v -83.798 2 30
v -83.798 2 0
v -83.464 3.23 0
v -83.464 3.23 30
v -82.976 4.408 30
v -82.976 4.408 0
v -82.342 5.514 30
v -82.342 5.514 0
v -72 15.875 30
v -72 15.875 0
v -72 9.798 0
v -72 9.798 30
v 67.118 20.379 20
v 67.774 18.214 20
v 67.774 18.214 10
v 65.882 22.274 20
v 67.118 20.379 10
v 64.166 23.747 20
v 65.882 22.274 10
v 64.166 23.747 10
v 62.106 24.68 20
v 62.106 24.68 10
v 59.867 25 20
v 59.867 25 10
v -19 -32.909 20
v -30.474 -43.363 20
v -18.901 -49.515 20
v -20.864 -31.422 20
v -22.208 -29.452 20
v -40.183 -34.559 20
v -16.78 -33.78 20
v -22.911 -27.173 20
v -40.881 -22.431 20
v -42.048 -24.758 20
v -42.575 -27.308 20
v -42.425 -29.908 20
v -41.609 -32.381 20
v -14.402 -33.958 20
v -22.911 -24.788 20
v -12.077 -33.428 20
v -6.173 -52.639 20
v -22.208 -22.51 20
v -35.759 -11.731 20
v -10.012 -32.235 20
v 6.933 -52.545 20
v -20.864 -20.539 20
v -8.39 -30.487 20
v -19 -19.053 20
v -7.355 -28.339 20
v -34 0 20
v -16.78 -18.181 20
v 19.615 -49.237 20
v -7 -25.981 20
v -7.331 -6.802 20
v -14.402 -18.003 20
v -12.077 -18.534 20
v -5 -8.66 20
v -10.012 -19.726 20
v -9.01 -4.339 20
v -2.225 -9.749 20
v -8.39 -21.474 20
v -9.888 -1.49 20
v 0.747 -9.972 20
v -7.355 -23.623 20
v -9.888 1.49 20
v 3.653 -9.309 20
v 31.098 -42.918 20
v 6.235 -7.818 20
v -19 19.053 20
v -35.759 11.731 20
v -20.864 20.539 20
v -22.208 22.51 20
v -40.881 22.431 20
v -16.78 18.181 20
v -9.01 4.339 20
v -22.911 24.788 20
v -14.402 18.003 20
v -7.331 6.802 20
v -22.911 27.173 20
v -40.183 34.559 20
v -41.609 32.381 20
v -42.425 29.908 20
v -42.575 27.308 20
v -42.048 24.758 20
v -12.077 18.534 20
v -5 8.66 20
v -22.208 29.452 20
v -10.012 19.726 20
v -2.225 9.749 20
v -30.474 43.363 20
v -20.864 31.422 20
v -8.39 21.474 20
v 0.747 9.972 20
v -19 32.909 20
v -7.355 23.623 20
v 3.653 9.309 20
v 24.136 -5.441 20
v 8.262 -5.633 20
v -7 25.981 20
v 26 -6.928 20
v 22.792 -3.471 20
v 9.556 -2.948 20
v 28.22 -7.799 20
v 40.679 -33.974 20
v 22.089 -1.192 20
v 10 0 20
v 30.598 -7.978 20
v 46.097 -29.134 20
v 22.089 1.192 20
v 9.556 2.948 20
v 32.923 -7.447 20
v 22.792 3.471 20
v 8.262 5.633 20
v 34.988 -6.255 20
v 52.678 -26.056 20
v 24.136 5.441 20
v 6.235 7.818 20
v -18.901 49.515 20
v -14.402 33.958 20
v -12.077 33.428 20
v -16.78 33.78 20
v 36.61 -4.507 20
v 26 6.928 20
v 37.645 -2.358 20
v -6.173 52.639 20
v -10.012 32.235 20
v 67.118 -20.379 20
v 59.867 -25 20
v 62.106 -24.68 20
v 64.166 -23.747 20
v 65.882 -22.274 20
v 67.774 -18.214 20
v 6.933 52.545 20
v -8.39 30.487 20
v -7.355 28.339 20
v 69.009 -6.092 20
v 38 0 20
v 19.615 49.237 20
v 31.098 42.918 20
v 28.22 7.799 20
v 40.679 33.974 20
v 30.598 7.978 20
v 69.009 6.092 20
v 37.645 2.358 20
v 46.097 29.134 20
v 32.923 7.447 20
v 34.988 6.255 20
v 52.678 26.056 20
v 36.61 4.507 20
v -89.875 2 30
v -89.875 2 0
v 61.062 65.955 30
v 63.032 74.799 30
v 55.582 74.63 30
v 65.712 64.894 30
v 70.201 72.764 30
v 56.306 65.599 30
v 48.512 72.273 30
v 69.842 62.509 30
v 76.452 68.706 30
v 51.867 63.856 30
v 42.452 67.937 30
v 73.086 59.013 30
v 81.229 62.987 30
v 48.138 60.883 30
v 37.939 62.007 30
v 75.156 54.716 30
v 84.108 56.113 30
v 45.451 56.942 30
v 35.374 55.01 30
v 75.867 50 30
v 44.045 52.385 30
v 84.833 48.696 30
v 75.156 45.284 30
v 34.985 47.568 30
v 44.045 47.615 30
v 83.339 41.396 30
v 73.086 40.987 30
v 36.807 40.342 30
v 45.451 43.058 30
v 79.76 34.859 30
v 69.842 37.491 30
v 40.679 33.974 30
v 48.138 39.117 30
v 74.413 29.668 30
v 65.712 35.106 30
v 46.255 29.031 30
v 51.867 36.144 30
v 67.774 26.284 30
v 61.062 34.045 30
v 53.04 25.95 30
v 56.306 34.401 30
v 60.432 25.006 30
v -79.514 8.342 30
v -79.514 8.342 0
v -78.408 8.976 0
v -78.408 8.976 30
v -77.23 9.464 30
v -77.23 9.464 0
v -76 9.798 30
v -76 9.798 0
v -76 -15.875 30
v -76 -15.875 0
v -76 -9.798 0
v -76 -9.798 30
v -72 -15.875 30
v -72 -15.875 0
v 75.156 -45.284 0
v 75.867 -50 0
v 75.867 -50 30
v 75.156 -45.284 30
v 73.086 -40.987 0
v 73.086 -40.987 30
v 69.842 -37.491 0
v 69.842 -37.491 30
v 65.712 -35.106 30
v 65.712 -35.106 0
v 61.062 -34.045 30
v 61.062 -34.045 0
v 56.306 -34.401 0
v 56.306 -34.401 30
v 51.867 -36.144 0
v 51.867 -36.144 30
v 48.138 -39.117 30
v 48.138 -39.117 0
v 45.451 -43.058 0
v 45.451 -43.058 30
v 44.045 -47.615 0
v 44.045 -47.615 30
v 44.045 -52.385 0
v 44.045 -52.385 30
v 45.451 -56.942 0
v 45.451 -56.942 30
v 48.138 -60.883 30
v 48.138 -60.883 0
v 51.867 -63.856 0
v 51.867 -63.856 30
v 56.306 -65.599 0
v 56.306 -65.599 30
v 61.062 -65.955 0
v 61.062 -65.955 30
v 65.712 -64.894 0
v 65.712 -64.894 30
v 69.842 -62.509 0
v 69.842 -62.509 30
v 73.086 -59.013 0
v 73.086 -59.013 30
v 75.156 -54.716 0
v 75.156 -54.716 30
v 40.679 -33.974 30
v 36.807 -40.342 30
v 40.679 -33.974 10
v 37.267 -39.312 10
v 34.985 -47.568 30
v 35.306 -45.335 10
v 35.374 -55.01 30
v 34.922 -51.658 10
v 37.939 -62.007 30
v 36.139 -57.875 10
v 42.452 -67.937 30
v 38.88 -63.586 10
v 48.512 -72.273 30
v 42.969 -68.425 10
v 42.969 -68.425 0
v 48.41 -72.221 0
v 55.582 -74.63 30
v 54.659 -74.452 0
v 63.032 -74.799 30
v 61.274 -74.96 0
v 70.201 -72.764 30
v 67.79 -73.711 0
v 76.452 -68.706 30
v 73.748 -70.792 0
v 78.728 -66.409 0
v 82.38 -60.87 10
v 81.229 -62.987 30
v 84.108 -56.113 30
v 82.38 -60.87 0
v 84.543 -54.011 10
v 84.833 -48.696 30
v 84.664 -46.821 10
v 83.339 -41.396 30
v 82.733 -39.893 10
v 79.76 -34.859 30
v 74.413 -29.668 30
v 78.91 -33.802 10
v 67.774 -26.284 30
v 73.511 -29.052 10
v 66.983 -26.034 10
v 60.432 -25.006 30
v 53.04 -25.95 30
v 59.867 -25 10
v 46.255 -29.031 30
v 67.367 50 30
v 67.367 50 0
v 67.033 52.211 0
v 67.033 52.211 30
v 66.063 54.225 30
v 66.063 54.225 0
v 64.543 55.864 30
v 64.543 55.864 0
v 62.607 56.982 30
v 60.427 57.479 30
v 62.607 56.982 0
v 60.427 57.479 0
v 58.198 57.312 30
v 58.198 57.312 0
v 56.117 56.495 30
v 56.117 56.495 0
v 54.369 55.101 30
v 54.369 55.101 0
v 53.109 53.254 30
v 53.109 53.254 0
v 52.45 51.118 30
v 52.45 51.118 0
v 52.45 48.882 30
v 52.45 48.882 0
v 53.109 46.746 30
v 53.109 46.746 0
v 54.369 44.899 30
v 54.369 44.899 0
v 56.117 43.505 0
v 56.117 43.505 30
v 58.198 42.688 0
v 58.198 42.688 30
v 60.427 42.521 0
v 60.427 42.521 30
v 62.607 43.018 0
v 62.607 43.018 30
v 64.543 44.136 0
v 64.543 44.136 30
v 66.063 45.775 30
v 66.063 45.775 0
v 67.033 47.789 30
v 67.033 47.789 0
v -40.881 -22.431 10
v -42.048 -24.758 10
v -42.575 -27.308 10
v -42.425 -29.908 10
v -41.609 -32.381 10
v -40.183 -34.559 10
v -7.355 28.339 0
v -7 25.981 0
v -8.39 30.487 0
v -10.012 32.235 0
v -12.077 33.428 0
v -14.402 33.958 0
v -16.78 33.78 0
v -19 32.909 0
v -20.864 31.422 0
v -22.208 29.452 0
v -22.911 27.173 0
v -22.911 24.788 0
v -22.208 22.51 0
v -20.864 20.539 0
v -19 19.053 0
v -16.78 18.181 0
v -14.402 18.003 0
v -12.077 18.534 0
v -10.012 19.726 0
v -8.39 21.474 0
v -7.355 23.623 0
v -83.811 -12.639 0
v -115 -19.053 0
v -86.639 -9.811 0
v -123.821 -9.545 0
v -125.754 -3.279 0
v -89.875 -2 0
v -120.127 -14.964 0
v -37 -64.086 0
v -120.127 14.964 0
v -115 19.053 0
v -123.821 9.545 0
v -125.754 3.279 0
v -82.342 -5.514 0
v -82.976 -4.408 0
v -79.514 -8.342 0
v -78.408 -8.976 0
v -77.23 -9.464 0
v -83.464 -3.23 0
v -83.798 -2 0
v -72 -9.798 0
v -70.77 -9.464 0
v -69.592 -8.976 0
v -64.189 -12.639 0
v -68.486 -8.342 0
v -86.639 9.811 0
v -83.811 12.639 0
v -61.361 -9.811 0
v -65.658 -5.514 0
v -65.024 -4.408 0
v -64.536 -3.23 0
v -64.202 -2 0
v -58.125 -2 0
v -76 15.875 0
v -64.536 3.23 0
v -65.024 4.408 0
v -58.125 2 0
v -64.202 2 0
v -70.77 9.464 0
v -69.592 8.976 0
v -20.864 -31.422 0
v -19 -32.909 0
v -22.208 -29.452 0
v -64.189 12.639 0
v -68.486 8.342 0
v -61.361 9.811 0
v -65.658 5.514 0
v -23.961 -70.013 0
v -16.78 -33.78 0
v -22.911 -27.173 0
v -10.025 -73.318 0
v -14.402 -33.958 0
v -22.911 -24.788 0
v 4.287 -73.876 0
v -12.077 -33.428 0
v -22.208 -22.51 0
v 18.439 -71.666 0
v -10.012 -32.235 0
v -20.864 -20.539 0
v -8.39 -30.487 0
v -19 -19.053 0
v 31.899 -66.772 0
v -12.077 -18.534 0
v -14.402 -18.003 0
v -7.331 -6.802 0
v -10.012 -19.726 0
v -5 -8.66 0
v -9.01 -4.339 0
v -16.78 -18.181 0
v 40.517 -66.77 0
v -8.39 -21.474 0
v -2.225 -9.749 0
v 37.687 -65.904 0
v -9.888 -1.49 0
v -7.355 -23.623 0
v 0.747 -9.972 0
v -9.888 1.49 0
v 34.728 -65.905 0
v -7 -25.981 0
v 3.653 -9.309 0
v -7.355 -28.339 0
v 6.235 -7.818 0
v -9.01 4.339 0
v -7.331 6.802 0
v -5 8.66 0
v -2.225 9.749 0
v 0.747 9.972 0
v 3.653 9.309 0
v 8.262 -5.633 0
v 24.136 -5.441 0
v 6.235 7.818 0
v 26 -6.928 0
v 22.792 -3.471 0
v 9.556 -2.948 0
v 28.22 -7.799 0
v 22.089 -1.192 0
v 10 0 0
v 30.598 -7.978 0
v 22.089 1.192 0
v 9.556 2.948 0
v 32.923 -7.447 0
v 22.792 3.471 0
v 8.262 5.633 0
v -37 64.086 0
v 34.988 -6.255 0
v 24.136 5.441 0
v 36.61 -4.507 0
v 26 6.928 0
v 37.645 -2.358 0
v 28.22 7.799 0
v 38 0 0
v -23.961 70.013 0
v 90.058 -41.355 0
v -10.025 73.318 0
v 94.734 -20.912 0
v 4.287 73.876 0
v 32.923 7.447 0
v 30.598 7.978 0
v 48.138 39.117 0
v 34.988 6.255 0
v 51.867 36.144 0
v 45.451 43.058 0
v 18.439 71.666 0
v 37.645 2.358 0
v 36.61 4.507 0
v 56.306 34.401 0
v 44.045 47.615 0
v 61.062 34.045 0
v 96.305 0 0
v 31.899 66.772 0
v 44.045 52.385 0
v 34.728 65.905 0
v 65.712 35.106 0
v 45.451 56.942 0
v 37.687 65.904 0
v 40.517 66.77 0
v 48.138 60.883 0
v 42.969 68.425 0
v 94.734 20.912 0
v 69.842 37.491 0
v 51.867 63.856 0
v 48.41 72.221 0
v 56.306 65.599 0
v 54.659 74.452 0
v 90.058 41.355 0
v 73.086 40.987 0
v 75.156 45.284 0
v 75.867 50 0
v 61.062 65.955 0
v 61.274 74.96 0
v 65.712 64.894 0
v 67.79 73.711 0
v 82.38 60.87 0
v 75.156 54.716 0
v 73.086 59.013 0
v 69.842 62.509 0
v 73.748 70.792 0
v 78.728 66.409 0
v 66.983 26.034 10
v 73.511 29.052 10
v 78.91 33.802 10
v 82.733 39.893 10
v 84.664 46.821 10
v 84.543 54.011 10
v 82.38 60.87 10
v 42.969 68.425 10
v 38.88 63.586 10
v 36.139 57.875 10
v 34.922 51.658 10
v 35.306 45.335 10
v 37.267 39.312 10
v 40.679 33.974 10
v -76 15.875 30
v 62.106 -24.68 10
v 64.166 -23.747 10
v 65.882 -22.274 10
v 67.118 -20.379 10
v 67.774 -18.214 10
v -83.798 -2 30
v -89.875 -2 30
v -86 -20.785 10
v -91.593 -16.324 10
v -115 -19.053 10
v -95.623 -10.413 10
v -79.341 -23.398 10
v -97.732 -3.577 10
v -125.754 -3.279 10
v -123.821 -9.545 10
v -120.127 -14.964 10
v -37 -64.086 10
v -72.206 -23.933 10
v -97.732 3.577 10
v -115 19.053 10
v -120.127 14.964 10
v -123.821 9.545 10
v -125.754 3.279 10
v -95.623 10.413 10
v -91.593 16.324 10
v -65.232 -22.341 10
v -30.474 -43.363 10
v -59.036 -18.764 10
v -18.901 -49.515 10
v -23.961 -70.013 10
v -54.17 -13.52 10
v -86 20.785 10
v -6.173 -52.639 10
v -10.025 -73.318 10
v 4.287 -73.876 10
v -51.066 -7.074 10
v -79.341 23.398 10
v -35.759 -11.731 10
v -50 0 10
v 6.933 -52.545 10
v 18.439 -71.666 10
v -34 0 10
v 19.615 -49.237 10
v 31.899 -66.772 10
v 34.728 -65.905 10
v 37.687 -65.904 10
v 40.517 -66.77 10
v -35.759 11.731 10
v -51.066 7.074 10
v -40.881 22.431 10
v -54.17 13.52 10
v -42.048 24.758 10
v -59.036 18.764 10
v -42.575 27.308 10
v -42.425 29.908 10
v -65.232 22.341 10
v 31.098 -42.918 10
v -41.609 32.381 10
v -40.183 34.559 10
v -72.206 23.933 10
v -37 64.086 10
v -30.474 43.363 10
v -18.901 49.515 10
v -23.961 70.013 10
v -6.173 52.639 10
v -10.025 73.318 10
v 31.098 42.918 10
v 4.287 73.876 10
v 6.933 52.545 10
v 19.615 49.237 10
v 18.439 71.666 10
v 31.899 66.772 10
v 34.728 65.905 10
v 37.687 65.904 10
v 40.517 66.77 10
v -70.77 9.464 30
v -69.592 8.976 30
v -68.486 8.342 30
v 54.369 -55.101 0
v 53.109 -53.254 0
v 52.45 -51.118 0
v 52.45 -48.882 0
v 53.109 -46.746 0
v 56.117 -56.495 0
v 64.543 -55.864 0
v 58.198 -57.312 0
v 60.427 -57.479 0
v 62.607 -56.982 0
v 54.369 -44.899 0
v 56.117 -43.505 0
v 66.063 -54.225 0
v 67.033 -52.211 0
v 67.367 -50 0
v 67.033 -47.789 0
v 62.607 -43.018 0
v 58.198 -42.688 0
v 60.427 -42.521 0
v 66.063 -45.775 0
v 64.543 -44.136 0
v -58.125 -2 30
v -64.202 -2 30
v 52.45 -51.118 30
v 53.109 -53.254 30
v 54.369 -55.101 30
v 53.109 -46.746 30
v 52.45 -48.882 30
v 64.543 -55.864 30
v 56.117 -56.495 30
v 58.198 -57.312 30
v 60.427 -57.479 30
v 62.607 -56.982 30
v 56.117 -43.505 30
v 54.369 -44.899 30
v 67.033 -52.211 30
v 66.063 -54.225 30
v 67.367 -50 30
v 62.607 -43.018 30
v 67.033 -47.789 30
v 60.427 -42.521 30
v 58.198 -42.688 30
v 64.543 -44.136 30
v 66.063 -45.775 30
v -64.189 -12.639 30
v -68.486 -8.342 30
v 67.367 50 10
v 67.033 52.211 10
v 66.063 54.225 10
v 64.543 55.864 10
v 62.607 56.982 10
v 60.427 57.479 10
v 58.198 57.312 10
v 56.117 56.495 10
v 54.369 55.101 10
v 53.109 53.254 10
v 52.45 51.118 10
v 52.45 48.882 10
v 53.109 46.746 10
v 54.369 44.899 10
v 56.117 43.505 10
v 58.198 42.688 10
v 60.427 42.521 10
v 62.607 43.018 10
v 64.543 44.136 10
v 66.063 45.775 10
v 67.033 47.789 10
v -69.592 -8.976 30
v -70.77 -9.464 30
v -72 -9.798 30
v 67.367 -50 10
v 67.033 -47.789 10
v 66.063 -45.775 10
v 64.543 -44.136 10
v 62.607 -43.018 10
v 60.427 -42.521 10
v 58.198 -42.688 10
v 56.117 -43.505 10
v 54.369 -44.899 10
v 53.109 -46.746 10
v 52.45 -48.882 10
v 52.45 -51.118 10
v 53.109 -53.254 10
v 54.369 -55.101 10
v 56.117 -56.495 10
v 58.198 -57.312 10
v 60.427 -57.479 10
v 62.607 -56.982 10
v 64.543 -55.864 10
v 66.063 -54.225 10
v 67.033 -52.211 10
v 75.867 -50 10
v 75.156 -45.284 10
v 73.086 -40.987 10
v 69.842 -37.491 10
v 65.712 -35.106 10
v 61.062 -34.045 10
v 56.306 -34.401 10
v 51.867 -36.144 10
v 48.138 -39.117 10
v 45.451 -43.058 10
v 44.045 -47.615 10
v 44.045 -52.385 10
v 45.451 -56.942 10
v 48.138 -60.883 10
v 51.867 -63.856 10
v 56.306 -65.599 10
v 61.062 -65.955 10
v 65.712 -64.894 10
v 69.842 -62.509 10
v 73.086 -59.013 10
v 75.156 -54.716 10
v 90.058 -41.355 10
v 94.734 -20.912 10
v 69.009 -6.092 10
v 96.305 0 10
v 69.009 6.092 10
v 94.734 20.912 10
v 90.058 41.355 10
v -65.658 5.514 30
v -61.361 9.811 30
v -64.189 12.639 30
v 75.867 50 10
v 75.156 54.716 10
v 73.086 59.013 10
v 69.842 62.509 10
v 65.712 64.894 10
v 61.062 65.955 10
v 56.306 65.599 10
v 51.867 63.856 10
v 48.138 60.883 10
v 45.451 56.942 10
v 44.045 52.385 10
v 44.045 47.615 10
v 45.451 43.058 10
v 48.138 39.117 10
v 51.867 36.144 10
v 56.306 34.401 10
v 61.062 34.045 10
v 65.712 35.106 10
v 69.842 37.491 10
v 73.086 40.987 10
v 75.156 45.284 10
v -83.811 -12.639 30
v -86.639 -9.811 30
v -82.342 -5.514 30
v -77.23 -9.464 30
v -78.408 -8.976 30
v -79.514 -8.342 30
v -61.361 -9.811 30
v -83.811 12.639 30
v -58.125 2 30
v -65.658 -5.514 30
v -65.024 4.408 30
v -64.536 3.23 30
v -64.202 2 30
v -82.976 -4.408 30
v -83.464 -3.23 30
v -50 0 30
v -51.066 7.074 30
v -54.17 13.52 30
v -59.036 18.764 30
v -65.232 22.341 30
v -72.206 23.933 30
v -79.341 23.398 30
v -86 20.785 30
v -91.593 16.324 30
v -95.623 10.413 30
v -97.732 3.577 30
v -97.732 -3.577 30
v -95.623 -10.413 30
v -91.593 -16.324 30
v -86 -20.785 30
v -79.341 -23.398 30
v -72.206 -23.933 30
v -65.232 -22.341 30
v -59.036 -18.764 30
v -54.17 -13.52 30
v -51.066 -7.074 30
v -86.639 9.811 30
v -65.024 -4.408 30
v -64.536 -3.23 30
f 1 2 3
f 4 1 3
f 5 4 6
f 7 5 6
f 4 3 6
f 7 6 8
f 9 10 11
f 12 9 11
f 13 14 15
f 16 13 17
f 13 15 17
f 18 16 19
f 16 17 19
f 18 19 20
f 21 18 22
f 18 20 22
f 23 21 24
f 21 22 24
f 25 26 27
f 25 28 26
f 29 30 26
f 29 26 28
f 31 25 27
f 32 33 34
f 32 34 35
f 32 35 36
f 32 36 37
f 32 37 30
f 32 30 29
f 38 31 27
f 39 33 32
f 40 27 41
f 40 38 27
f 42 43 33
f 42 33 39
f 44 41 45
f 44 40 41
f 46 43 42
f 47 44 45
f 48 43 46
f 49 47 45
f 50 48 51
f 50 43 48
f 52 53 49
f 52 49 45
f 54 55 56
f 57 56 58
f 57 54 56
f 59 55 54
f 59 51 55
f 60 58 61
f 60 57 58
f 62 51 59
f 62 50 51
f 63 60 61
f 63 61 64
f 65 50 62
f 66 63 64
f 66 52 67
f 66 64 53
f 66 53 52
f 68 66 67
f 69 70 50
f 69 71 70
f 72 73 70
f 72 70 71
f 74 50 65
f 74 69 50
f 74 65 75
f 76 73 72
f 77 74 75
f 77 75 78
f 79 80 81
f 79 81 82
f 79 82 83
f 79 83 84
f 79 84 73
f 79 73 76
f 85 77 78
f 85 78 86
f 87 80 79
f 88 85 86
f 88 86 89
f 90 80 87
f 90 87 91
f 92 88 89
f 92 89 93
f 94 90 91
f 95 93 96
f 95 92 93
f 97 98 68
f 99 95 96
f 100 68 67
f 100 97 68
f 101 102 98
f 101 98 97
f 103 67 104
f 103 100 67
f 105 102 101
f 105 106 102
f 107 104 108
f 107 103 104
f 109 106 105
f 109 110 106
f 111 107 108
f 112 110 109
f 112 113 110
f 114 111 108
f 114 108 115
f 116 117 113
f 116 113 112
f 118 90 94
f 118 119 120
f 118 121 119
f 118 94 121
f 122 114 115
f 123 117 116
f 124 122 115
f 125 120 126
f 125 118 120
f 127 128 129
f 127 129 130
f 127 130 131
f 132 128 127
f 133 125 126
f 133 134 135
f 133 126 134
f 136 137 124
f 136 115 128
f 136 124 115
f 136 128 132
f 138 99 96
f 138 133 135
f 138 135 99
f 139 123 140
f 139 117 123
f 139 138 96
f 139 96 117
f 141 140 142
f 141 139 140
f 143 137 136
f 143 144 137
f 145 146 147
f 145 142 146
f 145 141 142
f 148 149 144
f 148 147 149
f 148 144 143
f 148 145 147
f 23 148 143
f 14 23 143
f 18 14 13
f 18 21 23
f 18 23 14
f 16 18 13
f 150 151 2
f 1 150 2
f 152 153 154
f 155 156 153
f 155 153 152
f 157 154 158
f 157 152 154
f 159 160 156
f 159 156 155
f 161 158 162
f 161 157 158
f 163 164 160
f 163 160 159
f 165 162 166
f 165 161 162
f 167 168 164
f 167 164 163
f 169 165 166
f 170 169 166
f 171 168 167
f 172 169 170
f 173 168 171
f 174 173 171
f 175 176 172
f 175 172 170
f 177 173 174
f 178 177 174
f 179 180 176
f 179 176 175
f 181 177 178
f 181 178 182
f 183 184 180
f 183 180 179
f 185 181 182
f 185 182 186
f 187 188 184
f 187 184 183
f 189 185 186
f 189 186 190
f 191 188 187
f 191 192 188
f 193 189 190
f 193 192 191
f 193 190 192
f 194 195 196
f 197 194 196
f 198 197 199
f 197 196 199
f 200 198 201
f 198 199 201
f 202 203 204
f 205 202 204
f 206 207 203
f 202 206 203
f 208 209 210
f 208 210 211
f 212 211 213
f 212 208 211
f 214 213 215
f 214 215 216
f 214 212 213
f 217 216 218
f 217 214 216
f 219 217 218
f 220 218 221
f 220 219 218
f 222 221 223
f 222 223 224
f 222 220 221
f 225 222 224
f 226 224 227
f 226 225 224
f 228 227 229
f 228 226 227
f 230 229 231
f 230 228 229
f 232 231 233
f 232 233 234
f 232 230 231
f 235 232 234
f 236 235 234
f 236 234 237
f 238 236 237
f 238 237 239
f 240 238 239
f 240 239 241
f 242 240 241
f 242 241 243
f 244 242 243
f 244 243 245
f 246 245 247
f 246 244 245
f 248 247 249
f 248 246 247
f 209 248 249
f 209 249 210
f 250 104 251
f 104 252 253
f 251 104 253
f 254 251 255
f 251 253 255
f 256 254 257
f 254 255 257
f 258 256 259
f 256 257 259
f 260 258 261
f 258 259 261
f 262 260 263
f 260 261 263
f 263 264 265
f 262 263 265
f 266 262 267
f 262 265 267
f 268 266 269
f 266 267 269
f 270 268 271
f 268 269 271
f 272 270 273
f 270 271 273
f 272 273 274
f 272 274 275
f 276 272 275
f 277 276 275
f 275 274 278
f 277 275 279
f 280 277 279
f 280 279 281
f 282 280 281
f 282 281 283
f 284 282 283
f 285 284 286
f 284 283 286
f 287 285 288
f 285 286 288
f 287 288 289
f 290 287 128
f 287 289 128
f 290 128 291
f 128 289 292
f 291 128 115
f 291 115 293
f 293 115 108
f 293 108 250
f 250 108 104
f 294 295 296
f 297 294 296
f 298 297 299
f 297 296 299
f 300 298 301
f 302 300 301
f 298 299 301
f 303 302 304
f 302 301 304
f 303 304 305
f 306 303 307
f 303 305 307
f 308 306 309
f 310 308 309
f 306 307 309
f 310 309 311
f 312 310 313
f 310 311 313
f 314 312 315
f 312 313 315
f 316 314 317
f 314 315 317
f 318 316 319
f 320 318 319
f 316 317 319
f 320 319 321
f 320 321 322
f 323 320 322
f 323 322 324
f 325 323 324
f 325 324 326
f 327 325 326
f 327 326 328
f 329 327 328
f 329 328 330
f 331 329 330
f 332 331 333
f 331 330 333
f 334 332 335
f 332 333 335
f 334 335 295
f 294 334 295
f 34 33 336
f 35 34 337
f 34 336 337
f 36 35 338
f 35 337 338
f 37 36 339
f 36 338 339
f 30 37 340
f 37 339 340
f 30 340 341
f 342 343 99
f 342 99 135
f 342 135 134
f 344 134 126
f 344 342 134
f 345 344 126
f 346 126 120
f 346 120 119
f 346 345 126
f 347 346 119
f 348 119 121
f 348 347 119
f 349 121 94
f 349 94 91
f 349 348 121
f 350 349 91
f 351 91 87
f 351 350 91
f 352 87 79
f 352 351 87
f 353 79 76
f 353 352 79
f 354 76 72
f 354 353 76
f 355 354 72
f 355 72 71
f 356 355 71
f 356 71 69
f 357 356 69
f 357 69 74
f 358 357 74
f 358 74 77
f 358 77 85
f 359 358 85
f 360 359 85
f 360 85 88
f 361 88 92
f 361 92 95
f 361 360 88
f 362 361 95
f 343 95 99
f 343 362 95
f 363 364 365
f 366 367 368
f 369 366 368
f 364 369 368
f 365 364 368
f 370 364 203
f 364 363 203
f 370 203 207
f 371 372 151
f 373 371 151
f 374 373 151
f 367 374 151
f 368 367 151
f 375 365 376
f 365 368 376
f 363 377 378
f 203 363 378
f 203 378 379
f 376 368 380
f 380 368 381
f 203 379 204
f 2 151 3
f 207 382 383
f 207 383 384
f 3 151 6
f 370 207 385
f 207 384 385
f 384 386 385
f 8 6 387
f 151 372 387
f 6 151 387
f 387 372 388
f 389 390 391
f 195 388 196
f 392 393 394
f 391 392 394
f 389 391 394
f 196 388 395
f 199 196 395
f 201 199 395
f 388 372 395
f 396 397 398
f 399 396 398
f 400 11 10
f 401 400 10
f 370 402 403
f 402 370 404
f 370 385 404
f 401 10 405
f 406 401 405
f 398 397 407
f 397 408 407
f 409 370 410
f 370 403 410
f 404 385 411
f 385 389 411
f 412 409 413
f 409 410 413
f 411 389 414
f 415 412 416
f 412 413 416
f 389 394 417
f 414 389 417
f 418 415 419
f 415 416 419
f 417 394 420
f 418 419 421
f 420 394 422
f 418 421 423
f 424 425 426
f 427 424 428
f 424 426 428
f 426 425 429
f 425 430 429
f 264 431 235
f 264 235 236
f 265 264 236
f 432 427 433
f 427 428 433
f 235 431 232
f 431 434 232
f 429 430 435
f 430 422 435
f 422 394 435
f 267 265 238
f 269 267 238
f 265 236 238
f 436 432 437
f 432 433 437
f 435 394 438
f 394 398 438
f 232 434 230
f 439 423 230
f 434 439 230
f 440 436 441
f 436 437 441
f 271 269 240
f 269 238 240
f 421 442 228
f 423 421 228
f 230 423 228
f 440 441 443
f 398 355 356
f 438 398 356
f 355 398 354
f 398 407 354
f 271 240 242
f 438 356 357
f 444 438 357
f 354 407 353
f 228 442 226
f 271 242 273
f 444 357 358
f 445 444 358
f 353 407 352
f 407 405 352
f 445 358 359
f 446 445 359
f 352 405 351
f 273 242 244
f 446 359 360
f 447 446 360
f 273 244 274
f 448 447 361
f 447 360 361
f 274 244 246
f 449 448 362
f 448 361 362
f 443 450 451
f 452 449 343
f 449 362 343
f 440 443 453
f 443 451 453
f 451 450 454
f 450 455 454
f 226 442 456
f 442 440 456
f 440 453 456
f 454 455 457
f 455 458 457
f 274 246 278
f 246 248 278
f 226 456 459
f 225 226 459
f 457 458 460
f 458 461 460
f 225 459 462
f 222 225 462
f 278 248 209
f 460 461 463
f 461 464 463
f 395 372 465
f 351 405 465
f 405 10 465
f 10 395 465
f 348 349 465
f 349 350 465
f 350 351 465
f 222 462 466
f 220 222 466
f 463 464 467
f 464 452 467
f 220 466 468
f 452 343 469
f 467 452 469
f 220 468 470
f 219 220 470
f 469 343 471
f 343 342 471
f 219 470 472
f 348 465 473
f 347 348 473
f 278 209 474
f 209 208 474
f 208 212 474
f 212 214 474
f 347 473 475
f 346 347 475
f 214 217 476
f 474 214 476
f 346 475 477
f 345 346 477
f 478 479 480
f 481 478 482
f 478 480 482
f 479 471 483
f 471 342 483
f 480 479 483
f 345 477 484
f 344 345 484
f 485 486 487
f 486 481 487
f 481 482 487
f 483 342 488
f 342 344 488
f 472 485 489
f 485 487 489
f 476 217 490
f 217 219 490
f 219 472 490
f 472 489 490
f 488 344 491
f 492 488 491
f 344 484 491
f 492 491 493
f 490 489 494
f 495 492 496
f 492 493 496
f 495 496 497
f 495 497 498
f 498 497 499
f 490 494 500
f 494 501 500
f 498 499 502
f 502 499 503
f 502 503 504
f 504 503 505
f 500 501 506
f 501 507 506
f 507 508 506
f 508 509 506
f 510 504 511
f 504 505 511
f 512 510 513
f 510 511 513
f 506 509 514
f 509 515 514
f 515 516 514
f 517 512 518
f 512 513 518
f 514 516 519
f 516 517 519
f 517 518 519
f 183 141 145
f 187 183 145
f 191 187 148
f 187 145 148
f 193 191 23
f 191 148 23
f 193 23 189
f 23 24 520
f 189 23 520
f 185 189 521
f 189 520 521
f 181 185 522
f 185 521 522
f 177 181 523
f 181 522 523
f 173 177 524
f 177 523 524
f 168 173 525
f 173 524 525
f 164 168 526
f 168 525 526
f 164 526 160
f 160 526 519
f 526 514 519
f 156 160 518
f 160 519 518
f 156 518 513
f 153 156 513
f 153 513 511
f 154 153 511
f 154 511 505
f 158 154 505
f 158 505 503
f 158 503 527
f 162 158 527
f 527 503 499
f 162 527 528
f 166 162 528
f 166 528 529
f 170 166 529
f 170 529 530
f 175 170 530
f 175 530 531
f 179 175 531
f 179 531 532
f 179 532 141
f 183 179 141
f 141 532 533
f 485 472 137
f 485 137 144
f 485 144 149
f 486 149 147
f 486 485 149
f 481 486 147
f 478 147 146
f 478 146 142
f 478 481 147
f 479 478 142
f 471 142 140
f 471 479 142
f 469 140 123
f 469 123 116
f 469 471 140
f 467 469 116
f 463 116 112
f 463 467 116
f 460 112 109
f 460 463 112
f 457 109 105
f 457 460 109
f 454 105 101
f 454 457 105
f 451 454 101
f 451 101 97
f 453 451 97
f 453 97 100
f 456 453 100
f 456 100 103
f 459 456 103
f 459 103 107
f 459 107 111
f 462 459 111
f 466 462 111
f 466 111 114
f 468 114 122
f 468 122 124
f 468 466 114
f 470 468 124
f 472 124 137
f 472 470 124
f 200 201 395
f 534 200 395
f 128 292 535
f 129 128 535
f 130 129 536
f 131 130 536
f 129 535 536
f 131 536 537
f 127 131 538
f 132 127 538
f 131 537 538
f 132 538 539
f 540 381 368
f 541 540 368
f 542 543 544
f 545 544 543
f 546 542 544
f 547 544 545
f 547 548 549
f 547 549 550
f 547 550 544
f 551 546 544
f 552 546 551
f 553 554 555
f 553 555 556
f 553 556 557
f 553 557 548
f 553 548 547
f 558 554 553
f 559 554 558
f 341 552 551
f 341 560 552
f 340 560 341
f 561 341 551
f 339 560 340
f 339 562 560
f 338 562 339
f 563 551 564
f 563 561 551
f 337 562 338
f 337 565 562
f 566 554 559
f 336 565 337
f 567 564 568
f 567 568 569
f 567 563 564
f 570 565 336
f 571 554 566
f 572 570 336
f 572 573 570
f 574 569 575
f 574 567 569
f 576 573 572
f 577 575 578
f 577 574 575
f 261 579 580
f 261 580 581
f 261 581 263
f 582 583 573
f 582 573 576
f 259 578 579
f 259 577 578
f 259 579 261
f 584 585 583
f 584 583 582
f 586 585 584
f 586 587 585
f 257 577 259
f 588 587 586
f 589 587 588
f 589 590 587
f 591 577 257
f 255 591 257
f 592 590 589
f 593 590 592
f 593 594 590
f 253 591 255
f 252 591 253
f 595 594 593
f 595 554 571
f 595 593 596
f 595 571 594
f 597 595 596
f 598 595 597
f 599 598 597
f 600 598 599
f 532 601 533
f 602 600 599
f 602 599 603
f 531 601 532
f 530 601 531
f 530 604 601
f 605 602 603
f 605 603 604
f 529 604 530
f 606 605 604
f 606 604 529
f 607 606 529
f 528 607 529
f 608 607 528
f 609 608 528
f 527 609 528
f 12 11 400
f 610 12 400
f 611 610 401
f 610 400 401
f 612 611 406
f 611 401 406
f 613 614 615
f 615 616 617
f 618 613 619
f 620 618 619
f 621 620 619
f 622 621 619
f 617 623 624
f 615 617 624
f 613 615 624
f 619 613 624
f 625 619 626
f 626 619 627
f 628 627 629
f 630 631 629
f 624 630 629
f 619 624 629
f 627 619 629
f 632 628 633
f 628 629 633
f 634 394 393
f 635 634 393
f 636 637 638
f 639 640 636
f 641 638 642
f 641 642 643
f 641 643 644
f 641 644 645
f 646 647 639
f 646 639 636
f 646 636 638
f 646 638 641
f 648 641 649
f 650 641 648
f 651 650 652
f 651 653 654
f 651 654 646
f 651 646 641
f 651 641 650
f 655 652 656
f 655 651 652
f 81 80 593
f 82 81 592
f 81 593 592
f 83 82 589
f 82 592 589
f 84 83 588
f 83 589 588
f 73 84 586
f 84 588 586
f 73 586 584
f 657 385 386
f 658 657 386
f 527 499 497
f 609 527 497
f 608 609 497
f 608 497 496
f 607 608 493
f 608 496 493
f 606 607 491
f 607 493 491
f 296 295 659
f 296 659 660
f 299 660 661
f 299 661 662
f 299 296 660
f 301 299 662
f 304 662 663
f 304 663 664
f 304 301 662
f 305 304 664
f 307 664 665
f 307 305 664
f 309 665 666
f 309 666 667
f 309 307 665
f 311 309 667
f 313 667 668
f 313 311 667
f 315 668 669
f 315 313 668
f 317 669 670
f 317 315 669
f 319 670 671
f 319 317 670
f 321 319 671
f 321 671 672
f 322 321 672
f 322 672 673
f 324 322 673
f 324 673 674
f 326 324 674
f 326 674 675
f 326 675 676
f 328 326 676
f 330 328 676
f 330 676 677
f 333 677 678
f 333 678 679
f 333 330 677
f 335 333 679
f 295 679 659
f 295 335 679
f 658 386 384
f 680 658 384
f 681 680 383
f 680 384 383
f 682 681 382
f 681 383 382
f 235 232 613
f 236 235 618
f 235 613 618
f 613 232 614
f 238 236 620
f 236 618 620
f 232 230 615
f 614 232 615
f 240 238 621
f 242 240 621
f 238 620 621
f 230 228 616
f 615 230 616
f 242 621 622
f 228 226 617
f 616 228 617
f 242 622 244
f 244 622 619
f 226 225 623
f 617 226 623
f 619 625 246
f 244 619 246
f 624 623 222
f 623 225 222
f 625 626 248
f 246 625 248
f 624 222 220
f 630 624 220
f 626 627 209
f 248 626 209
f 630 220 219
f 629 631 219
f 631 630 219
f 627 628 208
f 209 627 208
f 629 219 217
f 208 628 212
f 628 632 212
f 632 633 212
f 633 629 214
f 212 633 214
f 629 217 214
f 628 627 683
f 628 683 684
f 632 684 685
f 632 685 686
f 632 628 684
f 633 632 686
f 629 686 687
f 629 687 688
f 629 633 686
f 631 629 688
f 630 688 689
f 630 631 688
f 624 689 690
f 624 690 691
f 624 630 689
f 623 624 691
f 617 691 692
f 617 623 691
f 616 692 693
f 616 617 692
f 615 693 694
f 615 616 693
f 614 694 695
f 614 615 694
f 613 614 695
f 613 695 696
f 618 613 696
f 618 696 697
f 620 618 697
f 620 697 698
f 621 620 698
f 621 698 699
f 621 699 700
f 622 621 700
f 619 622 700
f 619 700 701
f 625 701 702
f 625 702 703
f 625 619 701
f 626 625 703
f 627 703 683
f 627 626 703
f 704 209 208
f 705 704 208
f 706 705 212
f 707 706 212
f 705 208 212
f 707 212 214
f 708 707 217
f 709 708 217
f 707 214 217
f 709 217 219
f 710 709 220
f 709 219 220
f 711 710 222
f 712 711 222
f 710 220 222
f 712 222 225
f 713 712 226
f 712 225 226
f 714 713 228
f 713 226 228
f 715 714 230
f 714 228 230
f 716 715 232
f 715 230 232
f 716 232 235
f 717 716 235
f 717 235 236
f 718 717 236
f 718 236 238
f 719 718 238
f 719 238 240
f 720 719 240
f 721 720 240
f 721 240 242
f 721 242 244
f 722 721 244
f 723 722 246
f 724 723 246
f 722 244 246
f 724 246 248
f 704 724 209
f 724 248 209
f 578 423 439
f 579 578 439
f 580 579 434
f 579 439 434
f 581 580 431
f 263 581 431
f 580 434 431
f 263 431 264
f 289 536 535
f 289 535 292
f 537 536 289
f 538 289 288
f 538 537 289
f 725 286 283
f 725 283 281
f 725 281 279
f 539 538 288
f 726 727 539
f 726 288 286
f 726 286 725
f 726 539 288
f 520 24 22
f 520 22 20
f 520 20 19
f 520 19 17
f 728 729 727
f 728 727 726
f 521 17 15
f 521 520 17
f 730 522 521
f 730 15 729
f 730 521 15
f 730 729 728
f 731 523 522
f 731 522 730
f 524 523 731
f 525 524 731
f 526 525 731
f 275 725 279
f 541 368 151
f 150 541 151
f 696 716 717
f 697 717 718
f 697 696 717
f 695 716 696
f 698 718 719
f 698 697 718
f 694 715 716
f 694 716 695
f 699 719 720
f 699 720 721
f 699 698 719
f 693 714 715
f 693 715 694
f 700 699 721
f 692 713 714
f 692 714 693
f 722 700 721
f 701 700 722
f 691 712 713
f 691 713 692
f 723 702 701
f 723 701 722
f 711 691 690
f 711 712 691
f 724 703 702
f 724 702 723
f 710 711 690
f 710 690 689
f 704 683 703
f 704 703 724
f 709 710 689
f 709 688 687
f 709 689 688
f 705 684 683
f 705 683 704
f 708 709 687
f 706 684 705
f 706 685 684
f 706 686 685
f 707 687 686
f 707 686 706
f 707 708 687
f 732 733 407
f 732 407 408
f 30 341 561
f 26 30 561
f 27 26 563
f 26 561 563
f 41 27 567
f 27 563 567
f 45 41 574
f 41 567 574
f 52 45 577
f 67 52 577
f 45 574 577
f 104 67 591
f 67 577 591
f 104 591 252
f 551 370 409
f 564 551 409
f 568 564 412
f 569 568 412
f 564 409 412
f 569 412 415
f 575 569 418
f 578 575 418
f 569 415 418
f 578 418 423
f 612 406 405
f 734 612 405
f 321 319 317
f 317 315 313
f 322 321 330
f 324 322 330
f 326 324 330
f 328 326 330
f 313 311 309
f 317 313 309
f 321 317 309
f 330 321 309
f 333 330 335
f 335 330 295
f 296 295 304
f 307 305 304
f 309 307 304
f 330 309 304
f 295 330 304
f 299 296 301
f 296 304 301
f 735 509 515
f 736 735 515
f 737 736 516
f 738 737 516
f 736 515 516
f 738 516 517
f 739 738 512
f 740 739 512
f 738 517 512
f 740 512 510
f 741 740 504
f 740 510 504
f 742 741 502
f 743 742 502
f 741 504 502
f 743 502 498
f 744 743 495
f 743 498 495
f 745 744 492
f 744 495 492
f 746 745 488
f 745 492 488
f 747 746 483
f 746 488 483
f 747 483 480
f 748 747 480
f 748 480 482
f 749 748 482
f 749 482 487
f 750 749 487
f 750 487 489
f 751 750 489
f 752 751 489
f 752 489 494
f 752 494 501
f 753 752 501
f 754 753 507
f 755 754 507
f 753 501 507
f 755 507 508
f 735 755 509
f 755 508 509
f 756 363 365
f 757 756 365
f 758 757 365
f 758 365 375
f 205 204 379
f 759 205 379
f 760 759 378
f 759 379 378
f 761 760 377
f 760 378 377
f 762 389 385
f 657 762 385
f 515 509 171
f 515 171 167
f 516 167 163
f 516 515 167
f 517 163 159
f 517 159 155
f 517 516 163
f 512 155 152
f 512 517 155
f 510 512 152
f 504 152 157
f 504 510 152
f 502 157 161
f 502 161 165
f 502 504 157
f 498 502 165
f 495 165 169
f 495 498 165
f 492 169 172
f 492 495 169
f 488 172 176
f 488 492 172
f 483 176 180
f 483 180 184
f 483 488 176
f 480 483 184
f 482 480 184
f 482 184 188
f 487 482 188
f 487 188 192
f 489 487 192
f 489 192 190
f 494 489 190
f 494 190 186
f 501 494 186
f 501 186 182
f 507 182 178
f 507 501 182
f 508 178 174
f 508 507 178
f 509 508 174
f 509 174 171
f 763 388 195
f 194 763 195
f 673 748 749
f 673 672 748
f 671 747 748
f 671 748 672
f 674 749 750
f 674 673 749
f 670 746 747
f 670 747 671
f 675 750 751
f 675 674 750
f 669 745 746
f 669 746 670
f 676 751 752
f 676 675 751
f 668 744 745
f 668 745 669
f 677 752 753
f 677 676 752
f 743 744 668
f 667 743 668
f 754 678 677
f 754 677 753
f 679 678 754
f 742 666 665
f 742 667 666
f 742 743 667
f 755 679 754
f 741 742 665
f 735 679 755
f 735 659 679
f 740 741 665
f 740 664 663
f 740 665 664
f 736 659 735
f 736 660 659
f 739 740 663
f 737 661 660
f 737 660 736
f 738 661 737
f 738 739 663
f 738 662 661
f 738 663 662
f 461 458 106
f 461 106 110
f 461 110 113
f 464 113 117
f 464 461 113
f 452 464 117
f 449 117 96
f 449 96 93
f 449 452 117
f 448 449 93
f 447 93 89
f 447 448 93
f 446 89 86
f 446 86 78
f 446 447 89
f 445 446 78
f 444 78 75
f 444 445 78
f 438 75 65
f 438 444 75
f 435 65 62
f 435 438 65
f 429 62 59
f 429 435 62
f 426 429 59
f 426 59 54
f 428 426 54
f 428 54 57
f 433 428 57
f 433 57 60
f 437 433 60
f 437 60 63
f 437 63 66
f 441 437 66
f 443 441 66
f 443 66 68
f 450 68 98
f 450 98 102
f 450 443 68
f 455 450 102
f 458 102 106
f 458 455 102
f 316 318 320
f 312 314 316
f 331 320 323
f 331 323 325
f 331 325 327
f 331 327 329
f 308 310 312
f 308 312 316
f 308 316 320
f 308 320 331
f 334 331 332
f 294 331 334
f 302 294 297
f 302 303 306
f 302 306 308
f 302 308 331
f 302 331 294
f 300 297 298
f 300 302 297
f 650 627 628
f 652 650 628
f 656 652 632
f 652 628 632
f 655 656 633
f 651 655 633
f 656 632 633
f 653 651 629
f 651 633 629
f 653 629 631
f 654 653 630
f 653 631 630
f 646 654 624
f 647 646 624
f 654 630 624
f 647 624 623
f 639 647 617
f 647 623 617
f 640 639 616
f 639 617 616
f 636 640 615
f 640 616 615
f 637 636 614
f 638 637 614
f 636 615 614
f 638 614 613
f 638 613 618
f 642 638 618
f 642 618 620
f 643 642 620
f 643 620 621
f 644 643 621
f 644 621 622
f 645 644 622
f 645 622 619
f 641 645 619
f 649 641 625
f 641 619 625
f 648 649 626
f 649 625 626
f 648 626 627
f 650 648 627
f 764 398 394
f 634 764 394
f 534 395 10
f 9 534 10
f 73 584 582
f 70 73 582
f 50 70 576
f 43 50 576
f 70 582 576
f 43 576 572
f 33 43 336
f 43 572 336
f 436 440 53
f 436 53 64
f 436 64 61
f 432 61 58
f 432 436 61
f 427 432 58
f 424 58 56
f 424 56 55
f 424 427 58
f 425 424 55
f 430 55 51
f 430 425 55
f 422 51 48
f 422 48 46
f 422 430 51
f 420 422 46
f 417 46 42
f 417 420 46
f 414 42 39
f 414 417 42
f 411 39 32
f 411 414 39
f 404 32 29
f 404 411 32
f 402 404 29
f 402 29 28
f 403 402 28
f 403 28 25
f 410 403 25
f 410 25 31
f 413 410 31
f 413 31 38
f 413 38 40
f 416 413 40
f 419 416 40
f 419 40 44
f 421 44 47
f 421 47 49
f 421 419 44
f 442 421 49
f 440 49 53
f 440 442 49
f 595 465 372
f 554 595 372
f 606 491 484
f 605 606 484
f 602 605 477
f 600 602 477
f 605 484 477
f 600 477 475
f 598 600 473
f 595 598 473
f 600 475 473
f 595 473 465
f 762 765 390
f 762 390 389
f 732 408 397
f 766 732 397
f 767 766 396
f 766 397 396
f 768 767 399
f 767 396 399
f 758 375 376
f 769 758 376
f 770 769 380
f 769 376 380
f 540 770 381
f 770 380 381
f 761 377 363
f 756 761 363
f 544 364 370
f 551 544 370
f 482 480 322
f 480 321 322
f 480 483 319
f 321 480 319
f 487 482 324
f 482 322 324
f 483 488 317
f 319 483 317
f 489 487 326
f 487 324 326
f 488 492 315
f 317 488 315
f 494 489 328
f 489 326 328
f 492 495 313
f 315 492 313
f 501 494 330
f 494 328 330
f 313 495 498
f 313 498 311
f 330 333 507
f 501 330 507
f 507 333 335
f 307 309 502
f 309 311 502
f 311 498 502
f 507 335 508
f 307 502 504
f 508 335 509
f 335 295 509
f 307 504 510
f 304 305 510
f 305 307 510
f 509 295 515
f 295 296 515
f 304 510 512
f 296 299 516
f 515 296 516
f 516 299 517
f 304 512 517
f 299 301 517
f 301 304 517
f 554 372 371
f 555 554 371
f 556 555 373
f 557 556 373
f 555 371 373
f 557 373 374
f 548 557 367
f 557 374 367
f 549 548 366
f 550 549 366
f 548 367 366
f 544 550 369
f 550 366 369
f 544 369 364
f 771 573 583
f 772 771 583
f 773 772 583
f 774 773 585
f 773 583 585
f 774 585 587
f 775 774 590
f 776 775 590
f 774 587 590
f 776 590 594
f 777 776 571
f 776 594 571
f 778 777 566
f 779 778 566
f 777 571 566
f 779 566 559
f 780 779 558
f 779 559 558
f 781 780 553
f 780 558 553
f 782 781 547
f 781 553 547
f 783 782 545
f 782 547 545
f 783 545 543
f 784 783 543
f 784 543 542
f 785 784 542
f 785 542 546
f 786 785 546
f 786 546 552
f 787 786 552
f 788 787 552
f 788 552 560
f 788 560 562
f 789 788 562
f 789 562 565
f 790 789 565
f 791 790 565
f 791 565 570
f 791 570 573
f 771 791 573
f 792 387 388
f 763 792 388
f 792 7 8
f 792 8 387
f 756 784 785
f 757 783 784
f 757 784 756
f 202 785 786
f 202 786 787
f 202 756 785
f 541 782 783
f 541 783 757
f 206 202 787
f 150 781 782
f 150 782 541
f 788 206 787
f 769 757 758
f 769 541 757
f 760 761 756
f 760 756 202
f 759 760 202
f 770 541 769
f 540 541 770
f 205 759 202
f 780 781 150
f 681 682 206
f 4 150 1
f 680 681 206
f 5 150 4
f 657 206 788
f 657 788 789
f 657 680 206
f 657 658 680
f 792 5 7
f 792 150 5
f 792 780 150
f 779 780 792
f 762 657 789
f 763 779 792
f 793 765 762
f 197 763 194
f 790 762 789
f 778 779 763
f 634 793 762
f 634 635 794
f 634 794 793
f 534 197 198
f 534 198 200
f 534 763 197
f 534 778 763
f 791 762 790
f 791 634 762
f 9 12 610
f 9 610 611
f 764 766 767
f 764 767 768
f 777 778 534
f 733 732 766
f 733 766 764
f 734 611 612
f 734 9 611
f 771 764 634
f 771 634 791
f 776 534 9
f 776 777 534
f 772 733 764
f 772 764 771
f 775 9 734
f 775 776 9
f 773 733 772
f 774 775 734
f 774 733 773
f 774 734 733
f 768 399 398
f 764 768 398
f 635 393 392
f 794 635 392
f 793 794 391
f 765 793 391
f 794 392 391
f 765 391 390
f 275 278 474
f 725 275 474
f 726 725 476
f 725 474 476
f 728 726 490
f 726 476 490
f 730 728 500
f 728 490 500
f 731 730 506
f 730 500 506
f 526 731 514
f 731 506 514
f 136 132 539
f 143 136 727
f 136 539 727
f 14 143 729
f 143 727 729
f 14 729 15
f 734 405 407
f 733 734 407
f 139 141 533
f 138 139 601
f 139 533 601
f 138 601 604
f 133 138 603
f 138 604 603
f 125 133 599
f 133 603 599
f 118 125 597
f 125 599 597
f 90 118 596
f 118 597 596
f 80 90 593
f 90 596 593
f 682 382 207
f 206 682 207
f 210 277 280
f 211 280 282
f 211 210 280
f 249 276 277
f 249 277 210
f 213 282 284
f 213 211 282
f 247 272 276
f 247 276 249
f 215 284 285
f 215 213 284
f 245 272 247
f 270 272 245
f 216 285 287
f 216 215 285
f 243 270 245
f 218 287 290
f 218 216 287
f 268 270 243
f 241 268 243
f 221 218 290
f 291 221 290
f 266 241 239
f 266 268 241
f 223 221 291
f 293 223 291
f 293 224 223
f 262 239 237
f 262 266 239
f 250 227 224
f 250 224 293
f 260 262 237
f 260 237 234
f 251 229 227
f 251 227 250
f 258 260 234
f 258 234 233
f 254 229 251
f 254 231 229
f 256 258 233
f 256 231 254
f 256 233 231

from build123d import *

# Parameters (mm, degrees)
SKETCH_1_R        = 24
EXTRUDE_1_DEPTH   = 10
EXTRUDE_1_2_DEPTH = 10
SKETCH_1_R_2      = 16
SKETCH_1_R_3      = 7.5
EXTRUDE_1_3_DEPTH = 10
EXTRUDE_1_4_DEPTH = 10
SKETCH_1_3_R      = 8
SKETCH_1_3_R_2    = 10
EXTRUDE_2_DEPTH   = 20
SKETCH_1_4_R      = 24
SKETCH_1_4_R_2    = 25
SKETCH_1_4_R_3    = 16
SKETCH_1_4_R_4    = 7.5
EXTRUDE_3_DEPTH   = 30


with BuildPart() as part:
    # Эскиз1 → Бобышка-Вытянуть1 (new body)
    with BuildSketch(Plane.XY):
        with BuildLine():
            Line((-37, 64.08587988), (-115, 19.052558883))
            ThreePointArc((-115, 19.052558883), (-126, 0), (-115, -19.052558883))
            Line((-115, -19.052558883), (-37, -64.08587988))
            ThreePointArc((-37, -64.08587988), (-2.882289769, -73.9438463), (31.899251195, -66.771534153))
            ThreePointArc((31.899251195, -66.771534153), (37.687076323, -65.904409607), (42.968977208, -68.424796032))
            ThreePointArc((42.968977208, -68.424796032), (34.921589274, -51.658469616), (40.67853159, -33.974358974))
            ThreePointArc((40.67853159, -33.974358974), (0.383160449, -52.998614964), (-40.183060968, -34.55895848))
            ThreePointArc((-40.183060968, -34.55895848), (-42.584830472, -28.612982427), (-40.881081081, -22.430720221))
            ThreePointArc((-40.881081081, -22.430720221), (-34, 0), (-40.881081081, 22.430720221))
            ThreePointArc((-40.881081081, 22.430720221), (-42.584830472, 28.612982427), (-40.183060968, 34.55895848))
            ThreePointArc((-40.183060968, 34.55895848), (0.383160449, 52.998614964), (40.67853159, 33.974358974))
            ThreePointArc((40.67853159, 33.974358974), (34.921589274, 51.658469616), (42.968977208, 68.424796032))
            ThreePointArc((42.968977208, 68.424796032), (37.687076323, 65.904409607), (31.899251195, 66.771534153))
            ThreePointArc((31.899251195, 66.771534153), (-2.882289769, 73.9438463), (-37, 64.08587988))
        make_face()
        with Locations((-74, 0)):
            Circle(SKETCH_1_R, mode=Mode.SUBTRACT)
    extrude(amount=EXTRUDE_1_DEPTH)



with BuildPart() as body_2:
    # Эскиз1 → Extrude 1 2 (new body)
    with BuildSketch(Plane.XY):
        with BuildLine():
            ThreePointArc((82.379904251, -60.869565217), (96.304942302, 0), (82.379904251, 60.869565217))
            ThreePointArc((82.379904251, 60.869565217), (81.041257035, 36.709761673), (59.866518188, 25))
            ThreePointArc((59.866518188, 25), (65.076398911, 23.071008389), (67.773825581, 18.214285714))
            ThreePointArc((67.773825581, 18.214285714), (69.164214689, 0), (67.773825581, -18.214285714))
            ThreePointArc((67.773825581, -18.214285714), (65.076398911, -23.071008389), (59.866518188, -25))
            ThreePointArc((59.866518188, -25), (81.041257035, -36.709761673), (82.379904251, -60.869565217))
        make_face()
    extrude(amount=EXTRUDE_1_2_DEPTH)


with BuildPart() as body_3:
    # Эскиз1 → Extrude 1 3 (new body)
    with BuildSketch(Plane.XY):
        with Locations((59.866518188, 50)):
            Circle(SKETCH_1_R_2)
        with Locations((59.866518188, 50)):
            Circle(SKETCH_1_R_3, mode=Mode.SUBTRACT)
    extrude(amount=EXTRUDE_1_3_DEPTH)


with BuildPart() as body_4:
    # Эскиз1 → Extrude 1 4 (new body)
    with BuildSketch(Plane.XY):
        with Locations((59.866518188, -50)):
            Circle(SKETCH_1_R_2)
        with Locations((59.866518188, -50)):
            Circle(SKETCH_1_R_3, mode=Mode.SUBTRACT)
    extrude(amount=EXTRUDE_1_4_DEPTH)


with BuildPart() as part_1:
    add(part.part)

    add(body_2.part)  # Бобышка-Вытянуть2 merges body 2
    # Эскиз1<3> → Бобышка-Вытянуть2 (add)
    with BuildSketch(Plane.XY):
        with BuildLine():
            ThreePointArc((59.866518188, 25), (49.275036367, 27.354459317), (40.67853159, 33.974358974))
            ThreePointArc((40.67853159, 33.974358974), (0.383160449, 52.998614964), (-40.183060968, 34.55895848))
            ThreePointArc((-40.183060968, 34.55895848), (-42.584830472, 28.612982427), (-40.881081081, 22.430720221))
            ThreePointArc((-40.881081081, 22.430720221), (-34, 0), (-40.881081081, -22.430720221))
            ThreePointArc((-40.881081081, -22.430720221), (-42.584830472, -28.612982427), (-40.183060968, -34.55895848))
            ThreePointArc((-40.183060968, -34.55895848), (0.383160449, -52.998614964), (40.67853159, -33.974358974))
            ThreePointArc((40.67853159, -33.974358974), (49.275036367, -27.354459317), (59.866518188, -25))
            ThreePointArc((59.866518188, -25), (65.076398911, -23.071008389), (67.773825581, -18.214285714))
            ThreePointArc((67.773825581, -18.214285714), (69.164214689, 0), (67.773825581, 18.214285714))
            ThreePointArc((67.773825581, 18.214285714), (65.076398911, 23.071008389), (59.866518188, 25))
        make_face()
        with Locations((-15, -25.980762114)):
            Circle(SKETCH_1_3_R, mode=Mode.SUBTRACT)
        with Locations((-15, 25.980762114)):
            Circle(SKETCH_1_3_R, mode=Mode.SUBTRACT)
        Circle(SKETCH_1_3_R_2, mode=Mode.SUBTRACT)
        with Locations((30, 0)):
            Circle(SKETCH_1_3_R, mode=Mode.SUBTRACT)
    extrude(amount=EXTRUDE_2_DEPTH)

    # Эскиз1<4> → Бобышка-Вытянуть3 (add)
    # profile 1 of 5: a face of its own
    with BuildSketch(Plane.XY):
        with Locations((-74, 0)):
            Circle(SKETCH_1_4_R)
        with BuildLine():
            Line((-82.342416793, 5.513989668), (-86.639185723, 9.810758598))
            Line((-86.639185723, 9.810758598), (-83.810758598, 12.639185723))
            Line((-83.810758598, 12.639185723), (-79.513989668, 8.342416793))
            ThreePointArc((-79.513989668, 8.342416793), (-77.826834324, 9.238795325), (-76, 9.797958971))
            Line((-76, 9.797958971), (-76, 15.874507866))
            Line((-76, 15.874507866), (-72, 15.874507866))
            Line((-72, 15.874507866), (-72, 9.797958971))
            ThreePointArc((-72, 9.797958971), (-70.173165676, 9.238795325), (-68.486010332, 8.342416793))
            Line((-68.486010332, 8.342416793), (-64.189241402, 12.639185723))
            Line((-64.189241402, 12.639185723), (-61.360814277, 9.810758598))
            Line((-61.360814277, 9.810758598), (-65.657583207, 5.513989668))
            ThreePointArc((-65.657583207, 5.513989668), (-64.761204675, 3.826834324), (-64.202041029, 2))
            Line((-64.202041029, 2), (-58.125492134, 2))
            Line((-58.125492134, 2), (-58.125492134, -2))
            Line((-58.125492134, -2), (-64.202041029, -2))
            ThreePointArc((-64.202041029, -2), (-64.761204675, -3.826834324), (-65.657583207, -5.513989668))
            Line((-65.657583207, -5.513989668), (-61.360814277, -9.810758598))
            Line((-61.360814277, -9.810758598), (-64.189241402, -12.639185723))
            Line((-64.189241402, -12.639185723), (-68.486010332, -8.342416793))
            ThreePointArc((-68.486010332, -8.342416793), (-70.173165676, -9.238795325), (-72, -9.797958971))
            Line((-72, -9.797958971), (-72, -15.874507866))
            Line((-72, -15.874507866), (-76, -15.874507866))
            Line((-76, -15.874507866), (-76, -9.797958971))
            ThreePointArc((-76, -9.797958971), (-77.826834324, -9.238795325), (-79.513989668, -8.342416793))
            Line((-79.513989668, -8.342416793), (-83.810758598, -12.639185723))
            Line((-83.810758598, -12.639185723), (-86.639185723, -9.810758598))
            Line((-86.639185723, -9.810758598), (-82.342416793, -5.513989668))
            ThreePointArc((-82.342416793, -5.513989668), (-83.238795325, -3.826834324), (-83.797958971, -2))
            Line((-83.797958971, -2), (-89.874507866, -2))
            Line((-89.874507866, -2), (-89.874507866, 2))
            Line((-89.874507866, 2), (-83.797958971, 2))
            ThreePointArc((-83.797958971, 2), (-83.238795325, 3.826834324), (-82.342416793, 5.513989668))
        make_face(mode=Mode.SUBTRACT)
    # profile 2 of 5: a face of its own
    with BuildSketch(Plane.XY):
        with Locations(Location((59.866518188, -50, 0), (0, 0, 140.13165845))):
            Circle(SKETCH_1_4_R_2)
        with Locations((59.866518188, -50)):
            Circle(SKETCH_1_4_R_3, mode=Mode.SUBTRACT)
    # profile 3 of 5: a face of its own
    with BuildSketch(Plane.XY):
        with Locations(Location((59.866518188, 50, 0), (0, 0, 219.86834155))):
            Circle(SKETCH_1_4_R_2)
        with Locations((59.866518188, 50)):
            Circle(SKETCH_1_4_R_3, mode=Mode.SUBTRACT)
    # profile 4 of 5: a face of its own
    with BuildSketch(Plane.XY):
        with Locations((59.866518188, 50)):
            Circle(SKETCH_1_4_R_4)
    # profile 5 of 5: a face of its own
    with BuildSketch(Plane.XY):
        with Locations((59.866518188, -50)):
            Circle(SKETCH_1_4_R_4)
    extrude(amount=EXTRUDE_3_DEPTH)


with BuildPart() as extrude_3_piece_1:
    # of the separate pieces the step leaves, piece 1, a body of its own (extrude_3_pieces)
    add(part_1.part.solids().sort_by_distance((-37, 64.08587988, 0))[0])


with BuildPart() as extrude_3_piece_2:
    # of the separate pieces the step leaves, piece 2, a body of its own (extrude_3_pieces)
    add(part_1.part.solids().sort_by_distance((67.366518188, 50, 0))[0])


with BuildPart() as extrude_3_piece_3:
    # of the separate pieces the step leaves, piece 3, a body of its own (extrude_3_pieces)
    add(part_1.part.solids().sort_by_distance((67.366518188, -50, 0))[0])


solid = Compound([body_3.part, body_4.part, extrude_3_piece_1.part, extrude_3_piece_2.part, extrude_3_piece_3.part])
